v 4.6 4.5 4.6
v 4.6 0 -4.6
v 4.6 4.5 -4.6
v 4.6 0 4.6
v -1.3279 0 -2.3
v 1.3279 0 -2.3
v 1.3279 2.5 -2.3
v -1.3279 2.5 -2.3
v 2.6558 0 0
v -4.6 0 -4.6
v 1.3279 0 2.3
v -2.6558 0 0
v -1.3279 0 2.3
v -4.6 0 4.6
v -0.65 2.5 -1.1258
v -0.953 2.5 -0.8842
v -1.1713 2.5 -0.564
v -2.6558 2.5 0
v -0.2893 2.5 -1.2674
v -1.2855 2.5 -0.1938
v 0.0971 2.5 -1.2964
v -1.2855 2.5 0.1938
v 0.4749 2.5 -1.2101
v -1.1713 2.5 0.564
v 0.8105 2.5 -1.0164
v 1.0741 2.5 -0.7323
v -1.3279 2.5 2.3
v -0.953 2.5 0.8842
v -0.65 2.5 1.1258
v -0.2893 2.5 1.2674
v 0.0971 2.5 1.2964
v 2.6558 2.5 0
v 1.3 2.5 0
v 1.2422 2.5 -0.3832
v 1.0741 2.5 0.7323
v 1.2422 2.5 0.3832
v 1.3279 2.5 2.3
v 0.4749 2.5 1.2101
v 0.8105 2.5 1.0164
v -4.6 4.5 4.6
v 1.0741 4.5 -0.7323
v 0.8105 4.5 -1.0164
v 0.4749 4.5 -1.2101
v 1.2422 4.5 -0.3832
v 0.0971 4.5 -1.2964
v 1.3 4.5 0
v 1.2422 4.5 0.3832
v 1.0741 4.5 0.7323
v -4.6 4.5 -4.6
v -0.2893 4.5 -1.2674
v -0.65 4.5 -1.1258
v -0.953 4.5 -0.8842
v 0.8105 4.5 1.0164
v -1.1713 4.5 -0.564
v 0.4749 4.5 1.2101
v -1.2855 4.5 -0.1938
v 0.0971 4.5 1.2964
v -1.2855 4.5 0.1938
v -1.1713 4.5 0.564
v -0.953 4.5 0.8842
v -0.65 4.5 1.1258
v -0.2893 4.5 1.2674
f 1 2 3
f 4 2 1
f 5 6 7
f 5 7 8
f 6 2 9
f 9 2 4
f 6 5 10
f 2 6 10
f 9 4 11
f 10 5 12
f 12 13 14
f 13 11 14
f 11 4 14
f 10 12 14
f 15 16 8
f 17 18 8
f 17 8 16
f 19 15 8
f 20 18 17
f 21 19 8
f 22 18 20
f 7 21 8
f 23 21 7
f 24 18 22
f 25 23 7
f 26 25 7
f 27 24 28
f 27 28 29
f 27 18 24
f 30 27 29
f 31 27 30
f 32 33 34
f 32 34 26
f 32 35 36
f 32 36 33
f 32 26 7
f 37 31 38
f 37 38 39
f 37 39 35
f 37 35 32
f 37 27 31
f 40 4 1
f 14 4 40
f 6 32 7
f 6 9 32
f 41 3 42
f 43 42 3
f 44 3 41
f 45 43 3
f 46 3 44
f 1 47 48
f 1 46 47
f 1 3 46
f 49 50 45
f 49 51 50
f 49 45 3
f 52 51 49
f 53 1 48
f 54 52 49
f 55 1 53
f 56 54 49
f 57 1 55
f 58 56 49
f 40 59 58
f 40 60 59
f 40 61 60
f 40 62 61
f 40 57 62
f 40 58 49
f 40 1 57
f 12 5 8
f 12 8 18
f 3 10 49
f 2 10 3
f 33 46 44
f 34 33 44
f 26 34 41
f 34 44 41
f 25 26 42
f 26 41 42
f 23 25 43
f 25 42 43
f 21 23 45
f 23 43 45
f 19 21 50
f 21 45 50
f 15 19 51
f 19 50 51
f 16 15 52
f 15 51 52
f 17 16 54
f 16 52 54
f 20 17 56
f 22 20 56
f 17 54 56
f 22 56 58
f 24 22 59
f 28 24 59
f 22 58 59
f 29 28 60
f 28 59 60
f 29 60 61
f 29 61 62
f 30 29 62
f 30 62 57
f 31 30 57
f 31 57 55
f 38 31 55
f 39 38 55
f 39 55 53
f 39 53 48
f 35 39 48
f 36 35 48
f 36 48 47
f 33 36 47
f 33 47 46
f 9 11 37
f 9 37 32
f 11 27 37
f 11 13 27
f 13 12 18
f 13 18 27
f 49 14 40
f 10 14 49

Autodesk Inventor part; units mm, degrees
ref_plane "YZ Plane" through (0, 0, 0) normal (1, 0, 0) x (0, 1, 0)
ref_plane "XZ Plane" through (0, 0, 0) normal (0, 1, 0) x (-1, 0, 0)
ref_plane "XY Plane" through (0, 0, 0) normal (0, 0, 1) x (1, 0, 0)
sketch "Sketch1" plane through (0, 0, 0) normal (0, 1, 0) x (-1, 0, 0)
  line L0 (-4.6, 4.6) -> (4.6, 4.6)
  line L1 (4.6, 4.6) -> (4.6, -4.6)
  line L2 (4.6, -4.6) -> (-4.6, -4.6)
  line L3 (-4.6, -4.6) -> (-4.6, 4.6)
  point P0 (0, 0)
  dimension "d0" = 9.2
  dimension "d1" = 9.2
  dimension "d2" = 4.6
  dimension "d3" = 4.6
extrude "Extrusion1" add sketch "Sketch1" along normal blind 4.5
sketch "Sketch3" plane through (0, 0, 0) normal (0, -1, 0) x (1, 0, 0)
  line L0 (-4.6, -4.6) -> (4.6, -4.6) projected
  line L1 (-4.6, 4.6) -> (4.6, -4.6) construction
  line L2 (4.6, 4.6) -> (-4.6, -4.6) construction
  line L3 (1.3279, 2.3) -> (2.6558, 0)
  line L4 (2.6558, 0) -> (1.3279, -2.3)
  line L5 (1.3279, -2.3) -> (-1.3279, -2.3)
  line L6 (-1.3279, -2.3) -> (-2.6558, 0)
  line L7 (-2.6558, 0) -> (-1.3279, 2.3)
  line L8 (-1.3279, 2.3) -> (1.3279, 2.3)
  point P0 (0, 0)
  point P1 (0, 0)
  dimension "d7" = 4.6
extrude "Extrusion2" cut sketch "Sketch3" against normal blind 2.5
sketch "Sketch4" plane through (0, 4.5, 0) normal (0, 1, 0) x (1, 0, 0)
  circle A0 centre (0, 0) radius 1.3
  dimension "d10" = 2.6
extrude "Extrusion3" cut sketch "Sketch4" against normal blind 2
equation "\"d0\" = 2 * NutTrace"
equation "\"d1\" = d0"
equation "\"d2\" = 0.5 * d1"
equation "\"d3\" = 0.5 * d0"
equation "\"d4\" = ClassicThickness"
equation "\"d7\" = NutTrace"
equation "\"d8\" = NutThickness"
equation "\"d10\" = ServoScrewDiameterRequired"
equation "\"d11\" = MinimalThickness"
equation "\"NutTrace\" = 4.6"
equation "\"ClassicThickness\" = 4.5"
equation "\"NutThickness\" = 2.5"
equation "\"ServoScrewDiameterRequired\" = 2.6"
equation "\"MinimalThickness\" = 2"
properties part number "ScrewHeadTrace"
